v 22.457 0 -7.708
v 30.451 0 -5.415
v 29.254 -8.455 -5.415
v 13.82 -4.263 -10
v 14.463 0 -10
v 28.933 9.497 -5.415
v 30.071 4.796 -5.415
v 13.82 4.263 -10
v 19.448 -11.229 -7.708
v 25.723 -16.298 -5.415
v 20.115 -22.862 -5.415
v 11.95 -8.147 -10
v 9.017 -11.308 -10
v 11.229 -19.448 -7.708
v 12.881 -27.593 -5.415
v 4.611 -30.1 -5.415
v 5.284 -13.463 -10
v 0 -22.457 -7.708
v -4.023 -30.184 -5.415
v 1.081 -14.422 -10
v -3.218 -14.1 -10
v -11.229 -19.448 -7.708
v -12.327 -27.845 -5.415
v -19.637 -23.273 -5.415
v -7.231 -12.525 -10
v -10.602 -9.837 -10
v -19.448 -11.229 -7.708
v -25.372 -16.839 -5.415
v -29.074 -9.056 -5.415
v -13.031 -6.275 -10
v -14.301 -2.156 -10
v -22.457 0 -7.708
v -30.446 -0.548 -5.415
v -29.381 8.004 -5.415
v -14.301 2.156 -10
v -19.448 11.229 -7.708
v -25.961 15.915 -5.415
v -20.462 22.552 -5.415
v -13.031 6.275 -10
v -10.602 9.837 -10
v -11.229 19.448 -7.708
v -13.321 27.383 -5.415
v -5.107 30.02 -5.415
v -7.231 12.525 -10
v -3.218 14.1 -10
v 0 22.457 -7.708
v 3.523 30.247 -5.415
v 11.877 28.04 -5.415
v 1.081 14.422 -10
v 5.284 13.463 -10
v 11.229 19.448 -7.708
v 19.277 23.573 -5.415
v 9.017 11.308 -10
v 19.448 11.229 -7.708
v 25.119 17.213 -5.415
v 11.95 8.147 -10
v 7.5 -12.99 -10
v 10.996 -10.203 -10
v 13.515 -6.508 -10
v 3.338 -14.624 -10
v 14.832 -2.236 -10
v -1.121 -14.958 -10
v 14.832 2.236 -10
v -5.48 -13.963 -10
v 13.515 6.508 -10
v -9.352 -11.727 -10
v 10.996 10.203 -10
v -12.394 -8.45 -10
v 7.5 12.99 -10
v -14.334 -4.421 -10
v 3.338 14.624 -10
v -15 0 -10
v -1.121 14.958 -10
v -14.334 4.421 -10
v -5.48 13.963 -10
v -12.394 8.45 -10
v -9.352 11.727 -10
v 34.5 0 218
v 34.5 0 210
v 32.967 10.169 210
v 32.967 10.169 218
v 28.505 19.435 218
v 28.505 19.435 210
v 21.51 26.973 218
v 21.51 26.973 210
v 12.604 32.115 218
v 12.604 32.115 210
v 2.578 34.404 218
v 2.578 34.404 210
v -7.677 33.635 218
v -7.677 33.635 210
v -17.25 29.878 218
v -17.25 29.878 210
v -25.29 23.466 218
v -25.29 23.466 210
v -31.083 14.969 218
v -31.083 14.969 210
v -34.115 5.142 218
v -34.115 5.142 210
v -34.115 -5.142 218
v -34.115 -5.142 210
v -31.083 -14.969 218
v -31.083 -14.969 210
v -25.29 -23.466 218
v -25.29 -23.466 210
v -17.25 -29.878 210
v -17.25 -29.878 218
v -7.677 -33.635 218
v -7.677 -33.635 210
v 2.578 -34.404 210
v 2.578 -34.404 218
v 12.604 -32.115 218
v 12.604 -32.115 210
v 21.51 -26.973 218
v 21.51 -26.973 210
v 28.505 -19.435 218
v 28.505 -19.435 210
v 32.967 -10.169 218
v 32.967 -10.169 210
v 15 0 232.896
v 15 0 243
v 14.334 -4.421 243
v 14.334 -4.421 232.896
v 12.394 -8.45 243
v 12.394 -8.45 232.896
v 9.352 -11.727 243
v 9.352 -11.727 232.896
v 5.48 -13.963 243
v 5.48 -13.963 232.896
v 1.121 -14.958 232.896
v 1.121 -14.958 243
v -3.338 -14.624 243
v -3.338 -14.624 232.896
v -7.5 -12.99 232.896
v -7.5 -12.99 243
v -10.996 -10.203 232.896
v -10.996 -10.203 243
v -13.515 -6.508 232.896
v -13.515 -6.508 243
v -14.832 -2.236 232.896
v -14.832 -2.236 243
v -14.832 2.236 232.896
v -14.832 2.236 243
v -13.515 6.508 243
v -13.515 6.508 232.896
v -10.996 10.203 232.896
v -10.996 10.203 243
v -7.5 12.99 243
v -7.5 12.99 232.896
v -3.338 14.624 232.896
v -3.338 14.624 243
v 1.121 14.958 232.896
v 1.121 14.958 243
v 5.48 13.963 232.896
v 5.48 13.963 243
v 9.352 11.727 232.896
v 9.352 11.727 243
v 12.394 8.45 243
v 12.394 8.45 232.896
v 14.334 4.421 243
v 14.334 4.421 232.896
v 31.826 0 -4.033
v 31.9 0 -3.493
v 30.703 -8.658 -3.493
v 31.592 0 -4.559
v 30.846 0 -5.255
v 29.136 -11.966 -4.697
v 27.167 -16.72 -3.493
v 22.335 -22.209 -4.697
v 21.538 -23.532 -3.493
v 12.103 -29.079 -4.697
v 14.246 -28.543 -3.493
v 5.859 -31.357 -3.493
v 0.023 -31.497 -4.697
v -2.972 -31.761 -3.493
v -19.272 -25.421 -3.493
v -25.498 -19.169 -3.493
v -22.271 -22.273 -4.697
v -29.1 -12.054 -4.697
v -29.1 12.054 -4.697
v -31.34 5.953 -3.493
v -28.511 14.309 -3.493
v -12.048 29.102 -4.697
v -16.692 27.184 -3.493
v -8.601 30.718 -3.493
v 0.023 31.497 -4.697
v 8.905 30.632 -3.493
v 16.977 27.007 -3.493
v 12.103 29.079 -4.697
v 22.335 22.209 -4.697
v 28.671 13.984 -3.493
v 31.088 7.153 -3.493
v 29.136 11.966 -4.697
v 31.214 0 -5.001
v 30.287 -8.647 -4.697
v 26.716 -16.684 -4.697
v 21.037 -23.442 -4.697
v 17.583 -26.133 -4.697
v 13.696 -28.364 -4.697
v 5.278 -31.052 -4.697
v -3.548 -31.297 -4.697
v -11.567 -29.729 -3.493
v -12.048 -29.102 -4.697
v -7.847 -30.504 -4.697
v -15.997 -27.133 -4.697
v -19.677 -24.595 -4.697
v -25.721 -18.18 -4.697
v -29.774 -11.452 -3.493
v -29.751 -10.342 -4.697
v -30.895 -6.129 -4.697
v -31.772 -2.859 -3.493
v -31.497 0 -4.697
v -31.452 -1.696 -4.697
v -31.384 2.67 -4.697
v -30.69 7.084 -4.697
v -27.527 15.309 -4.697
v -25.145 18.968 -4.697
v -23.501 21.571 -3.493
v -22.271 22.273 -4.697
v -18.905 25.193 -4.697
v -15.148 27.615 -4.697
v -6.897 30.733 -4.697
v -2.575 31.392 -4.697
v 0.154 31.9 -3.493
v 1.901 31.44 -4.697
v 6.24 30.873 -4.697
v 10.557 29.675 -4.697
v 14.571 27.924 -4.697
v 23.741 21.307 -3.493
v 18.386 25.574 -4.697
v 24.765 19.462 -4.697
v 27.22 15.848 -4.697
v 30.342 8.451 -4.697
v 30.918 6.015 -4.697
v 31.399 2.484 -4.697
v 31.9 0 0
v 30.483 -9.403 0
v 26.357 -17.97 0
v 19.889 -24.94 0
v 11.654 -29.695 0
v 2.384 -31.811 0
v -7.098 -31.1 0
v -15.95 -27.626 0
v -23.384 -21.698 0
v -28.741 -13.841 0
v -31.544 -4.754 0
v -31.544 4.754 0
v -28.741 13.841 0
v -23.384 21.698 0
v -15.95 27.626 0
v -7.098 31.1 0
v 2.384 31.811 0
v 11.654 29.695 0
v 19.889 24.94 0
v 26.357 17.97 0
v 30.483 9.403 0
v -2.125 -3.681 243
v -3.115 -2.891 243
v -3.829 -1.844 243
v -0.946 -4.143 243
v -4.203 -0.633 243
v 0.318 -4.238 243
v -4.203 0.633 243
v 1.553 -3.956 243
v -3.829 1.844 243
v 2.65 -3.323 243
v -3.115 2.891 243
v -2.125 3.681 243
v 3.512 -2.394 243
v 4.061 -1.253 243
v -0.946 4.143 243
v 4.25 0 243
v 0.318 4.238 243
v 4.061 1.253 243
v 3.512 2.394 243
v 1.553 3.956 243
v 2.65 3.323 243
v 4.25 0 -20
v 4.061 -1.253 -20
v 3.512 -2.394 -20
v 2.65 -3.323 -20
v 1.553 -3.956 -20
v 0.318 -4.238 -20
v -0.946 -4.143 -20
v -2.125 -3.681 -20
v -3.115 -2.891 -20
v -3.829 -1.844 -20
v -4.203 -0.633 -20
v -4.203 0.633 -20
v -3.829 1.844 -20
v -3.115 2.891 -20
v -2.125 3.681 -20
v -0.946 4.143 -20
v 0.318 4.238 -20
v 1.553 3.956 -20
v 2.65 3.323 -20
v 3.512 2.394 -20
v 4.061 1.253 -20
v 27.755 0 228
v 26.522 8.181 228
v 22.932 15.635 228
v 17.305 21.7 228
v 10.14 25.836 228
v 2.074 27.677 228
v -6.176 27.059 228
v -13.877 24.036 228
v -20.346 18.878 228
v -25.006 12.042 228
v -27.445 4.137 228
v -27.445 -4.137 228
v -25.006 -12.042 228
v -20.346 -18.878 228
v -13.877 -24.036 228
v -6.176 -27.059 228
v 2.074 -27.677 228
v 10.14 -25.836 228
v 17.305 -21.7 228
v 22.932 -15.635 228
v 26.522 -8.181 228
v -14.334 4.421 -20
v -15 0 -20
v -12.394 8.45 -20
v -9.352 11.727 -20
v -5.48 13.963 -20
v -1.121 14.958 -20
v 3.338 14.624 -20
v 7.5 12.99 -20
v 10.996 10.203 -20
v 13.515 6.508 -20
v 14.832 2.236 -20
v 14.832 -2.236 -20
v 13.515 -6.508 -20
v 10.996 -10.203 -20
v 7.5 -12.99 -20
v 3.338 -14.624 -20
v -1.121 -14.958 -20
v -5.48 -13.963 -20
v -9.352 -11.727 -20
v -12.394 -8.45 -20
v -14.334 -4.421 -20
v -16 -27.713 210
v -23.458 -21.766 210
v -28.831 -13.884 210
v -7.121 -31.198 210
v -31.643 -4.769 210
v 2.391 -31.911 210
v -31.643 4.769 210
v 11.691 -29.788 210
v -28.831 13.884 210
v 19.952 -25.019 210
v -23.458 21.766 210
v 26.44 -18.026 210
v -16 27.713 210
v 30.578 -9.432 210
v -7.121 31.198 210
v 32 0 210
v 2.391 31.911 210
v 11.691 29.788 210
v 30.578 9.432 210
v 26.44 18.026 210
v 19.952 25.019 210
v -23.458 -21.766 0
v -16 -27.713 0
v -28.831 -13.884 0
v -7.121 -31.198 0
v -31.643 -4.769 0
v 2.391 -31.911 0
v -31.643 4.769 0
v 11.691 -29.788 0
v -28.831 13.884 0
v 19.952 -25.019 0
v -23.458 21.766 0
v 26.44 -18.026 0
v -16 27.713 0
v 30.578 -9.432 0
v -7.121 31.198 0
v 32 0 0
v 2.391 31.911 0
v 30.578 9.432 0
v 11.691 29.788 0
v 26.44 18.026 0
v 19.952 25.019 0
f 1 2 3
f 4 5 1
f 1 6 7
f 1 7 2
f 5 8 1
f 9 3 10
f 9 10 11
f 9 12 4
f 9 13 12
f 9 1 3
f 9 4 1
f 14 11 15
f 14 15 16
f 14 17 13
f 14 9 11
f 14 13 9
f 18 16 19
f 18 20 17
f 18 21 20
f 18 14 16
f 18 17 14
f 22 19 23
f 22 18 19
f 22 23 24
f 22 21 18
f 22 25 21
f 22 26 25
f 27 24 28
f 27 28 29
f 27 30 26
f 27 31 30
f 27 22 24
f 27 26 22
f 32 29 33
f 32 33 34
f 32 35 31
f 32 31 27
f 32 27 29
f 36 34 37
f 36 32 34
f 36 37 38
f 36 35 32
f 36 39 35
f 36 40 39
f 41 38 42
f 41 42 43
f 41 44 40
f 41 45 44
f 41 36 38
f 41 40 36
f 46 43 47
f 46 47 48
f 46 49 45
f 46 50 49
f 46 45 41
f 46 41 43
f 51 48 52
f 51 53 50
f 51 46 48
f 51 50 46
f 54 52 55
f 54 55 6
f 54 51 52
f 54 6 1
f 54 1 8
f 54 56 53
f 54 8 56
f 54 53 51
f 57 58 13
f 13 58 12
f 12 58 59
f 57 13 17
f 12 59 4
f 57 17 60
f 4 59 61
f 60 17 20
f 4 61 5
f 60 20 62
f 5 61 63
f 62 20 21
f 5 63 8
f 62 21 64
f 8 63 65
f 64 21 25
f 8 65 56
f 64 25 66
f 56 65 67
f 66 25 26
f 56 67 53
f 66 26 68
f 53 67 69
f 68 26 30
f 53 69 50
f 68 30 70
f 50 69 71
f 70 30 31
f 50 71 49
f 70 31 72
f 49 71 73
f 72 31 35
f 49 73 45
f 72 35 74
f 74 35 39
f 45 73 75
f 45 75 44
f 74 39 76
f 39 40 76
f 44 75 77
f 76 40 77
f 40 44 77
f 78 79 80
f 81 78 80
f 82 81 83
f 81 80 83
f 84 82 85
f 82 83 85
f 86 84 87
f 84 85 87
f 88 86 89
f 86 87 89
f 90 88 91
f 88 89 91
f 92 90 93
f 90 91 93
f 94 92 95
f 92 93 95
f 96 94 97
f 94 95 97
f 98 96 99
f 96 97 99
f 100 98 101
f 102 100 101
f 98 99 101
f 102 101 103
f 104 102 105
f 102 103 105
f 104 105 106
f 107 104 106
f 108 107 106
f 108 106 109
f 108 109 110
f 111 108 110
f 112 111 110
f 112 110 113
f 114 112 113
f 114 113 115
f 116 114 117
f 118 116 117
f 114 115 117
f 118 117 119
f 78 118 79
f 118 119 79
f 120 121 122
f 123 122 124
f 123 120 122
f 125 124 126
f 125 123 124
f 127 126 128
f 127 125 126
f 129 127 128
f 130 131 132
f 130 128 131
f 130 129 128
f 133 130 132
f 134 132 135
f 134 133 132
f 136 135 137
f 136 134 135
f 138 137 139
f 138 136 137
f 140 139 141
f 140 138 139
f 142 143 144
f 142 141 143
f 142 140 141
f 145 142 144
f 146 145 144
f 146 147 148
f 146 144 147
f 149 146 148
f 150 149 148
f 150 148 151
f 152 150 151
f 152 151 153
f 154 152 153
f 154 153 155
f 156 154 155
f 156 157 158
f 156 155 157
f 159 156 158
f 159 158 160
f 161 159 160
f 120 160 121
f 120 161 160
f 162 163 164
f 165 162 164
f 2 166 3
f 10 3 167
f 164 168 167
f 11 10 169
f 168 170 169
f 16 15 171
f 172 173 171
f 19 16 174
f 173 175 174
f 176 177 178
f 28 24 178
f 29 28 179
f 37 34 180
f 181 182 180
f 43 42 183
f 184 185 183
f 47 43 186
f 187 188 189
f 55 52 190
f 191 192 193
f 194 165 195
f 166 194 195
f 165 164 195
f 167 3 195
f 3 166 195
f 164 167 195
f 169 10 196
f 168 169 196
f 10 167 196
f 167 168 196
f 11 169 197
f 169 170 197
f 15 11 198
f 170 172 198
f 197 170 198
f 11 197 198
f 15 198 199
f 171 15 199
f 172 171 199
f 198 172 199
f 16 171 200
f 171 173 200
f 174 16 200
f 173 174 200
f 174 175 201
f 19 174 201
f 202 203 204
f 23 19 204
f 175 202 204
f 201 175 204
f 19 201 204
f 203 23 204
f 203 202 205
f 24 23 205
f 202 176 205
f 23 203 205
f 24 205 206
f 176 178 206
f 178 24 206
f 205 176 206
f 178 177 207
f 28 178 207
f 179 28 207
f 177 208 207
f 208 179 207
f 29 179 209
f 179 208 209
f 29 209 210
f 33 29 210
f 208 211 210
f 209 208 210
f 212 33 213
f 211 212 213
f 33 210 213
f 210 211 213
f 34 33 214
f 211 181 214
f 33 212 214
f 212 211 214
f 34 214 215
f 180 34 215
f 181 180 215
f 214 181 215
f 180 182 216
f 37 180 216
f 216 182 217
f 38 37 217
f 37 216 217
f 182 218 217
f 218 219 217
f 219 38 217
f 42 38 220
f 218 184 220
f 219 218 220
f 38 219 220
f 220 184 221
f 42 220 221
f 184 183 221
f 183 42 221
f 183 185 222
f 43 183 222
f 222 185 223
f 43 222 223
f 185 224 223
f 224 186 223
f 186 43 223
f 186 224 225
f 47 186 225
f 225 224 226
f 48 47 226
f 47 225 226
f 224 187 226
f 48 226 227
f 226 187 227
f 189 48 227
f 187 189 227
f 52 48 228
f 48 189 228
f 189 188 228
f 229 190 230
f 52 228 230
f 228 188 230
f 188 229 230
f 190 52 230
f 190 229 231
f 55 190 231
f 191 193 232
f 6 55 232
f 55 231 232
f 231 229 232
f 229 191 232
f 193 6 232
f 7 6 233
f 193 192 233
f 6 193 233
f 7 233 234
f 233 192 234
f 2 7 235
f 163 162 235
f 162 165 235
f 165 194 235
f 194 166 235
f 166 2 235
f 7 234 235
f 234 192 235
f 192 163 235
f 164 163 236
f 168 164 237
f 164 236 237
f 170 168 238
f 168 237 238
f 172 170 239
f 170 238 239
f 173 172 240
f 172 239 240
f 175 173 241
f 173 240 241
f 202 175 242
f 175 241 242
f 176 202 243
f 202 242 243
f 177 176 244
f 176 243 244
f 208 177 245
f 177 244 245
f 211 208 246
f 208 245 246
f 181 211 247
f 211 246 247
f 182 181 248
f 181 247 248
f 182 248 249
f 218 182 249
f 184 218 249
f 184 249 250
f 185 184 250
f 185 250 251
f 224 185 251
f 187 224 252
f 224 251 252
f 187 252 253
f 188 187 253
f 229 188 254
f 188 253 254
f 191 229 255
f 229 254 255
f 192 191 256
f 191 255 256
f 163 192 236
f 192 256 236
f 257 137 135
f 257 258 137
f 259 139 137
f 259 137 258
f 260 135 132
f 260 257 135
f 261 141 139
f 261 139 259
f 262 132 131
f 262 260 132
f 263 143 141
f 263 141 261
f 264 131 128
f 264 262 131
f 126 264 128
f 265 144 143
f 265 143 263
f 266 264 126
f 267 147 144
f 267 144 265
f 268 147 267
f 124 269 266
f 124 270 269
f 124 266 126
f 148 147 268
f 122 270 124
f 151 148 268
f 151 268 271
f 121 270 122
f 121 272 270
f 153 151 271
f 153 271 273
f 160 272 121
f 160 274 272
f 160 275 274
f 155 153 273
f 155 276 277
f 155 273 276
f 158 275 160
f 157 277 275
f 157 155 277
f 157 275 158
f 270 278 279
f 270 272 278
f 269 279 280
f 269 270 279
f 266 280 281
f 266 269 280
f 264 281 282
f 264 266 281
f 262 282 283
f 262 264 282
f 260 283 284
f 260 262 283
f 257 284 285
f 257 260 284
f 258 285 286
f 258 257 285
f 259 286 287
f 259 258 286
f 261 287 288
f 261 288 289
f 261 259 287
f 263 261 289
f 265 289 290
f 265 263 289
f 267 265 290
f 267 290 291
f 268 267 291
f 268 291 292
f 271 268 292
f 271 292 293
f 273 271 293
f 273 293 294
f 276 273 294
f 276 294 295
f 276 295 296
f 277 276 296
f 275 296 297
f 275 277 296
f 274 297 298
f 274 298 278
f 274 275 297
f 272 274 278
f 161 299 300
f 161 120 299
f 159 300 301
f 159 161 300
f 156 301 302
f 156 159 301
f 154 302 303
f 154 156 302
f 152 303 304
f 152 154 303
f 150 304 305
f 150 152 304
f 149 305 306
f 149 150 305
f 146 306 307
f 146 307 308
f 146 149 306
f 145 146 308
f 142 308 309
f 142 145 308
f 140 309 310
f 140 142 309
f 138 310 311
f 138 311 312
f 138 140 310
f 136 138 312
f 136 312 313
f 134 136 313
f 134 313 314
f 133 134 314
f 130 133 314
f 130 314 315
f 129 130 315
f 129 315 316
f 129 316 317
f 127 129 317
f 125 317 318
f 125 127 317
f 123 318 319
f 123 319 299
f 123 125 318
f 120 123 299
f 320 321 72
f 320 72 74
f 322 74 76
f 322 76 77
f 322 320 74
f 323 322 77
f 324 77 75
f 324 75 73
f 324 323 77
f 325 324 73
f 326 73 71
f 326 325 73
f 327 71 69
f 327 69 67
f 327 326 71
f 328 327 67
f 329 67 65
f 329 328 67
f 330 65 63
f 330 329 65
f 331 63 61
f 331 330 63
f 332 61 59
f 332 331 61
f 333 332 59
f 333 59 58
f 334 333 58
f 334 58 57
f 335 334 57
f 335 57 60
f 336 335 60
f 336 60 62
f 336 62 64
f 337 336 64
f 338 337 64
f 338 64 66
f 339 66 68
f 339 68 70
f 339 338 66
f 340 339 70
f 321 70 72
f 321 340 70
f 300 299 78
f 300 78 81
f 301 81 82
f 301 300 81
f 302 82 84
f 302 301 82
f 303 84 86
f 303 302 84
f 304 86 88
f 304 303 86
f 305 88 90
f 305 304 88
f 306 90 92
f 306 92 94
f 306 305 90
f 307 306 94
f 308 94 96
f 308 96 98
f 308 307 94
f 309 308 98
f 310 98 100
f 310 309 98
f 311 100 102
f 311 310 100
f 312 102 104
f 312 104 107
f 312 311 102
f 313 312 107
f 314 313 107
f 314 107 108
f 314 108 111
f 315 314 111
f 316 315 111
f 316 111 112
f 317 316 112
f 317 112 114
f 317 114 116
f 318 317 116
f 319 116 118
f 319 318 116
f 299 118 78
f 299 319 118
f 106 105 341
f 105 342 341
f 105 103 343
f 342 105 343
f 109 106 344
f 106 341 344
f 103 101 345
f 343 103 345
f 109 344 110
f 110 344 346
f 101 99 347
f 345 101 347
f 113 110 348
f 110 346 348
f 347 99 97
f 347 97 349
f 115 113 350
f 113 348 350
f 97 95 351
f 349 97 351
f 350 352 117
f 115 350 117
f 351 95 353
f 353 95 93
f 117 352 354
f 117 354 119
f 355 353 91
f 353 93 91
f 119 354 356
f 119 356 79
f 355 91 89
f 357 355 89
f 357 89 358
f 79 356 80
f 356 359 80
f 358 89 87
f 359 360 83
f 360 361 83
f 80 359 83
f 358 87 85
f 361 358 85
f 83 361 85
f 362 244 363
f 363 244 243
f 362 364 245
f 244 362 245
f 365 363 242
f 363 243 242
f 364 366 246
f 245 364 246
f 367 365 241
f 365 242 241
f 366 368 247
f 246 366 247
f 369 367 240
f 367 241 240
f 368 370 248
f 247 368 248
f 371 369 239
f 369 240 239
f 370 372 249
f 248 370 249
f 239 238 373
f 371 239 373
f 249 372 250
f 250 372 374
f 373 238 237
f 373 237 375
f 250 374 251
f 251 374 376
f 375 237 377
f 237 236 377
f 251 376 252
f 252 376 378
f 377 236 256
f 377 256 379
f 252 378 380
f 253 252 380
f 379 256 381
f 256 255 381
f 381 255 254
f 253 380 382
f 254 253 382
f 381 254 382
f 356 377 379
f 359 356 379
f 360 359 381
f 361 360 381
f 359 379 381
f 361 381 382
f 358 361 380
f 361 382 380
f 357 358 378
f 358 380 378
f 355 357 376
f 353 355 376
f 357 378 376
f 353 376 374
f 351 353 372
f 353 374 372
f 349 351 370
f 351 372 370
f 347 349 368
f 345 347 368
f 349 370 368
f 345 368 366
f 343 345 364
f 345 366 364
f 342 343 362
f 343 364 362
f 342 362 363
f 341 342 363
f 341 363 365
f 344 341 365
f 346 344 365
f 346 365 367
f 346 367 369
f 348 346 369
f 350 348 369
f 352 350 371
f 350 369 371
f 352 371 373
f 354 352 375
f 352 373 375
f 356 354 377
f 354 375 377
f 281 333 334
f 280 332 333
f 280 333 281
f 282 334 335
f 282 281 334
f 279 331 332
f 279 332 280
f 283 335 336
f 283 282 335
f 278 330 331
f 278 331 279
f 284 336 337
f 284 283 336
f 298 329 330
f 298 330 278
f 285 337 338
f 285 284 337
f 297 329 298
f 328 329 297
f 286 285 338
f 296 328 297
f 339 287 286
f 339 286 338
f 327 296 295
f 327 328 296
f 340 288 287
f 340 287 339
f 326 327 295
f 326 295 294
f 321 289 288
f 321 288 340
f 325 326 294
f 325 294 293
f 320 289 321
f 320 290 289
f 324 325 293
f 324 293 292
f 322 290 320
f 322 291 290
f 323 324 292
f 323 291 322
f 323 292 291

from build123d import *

# Parameters (mm, degrees)
SKETCH1_R           = 32
BOSS_EXTRUDE1_DEPTH = 210
SKETCH2_R           = 34.5
BOSS_EXTRUDE2_DEPTH = 18
CHAMFER1_SIZE       = 10
CHAMFER1_SIZE2      = 6.745085168
SKETCH3_R           = 27.754914832
BOSS_EXTRUDE3_DEPTH = 5
SKETCH4_R           = 15
BOSS_EXTRUDE4_DEPTH = 10
SKETCH5_R           = 4.25
CUT_EXTRUDE1_DEPTH  = 854
CHAMFER2_SIZE       = 5
CHAMFER2_SIZE_2     = 13.025445323
SKETCH7_R           = 31.9
BOSS_EXTRUDE7_DEPTH = 10
CHAMFER3_SIZE       = 5
CHAMFER3_SIZE2      = 17.437072219
FILLET1_R           = 2
BOSS_EXTRUDE8_START = 10
SKETCH8_R           = 15
BOSS_EXTRUDE8_DEPTH = 10
CUT_EXTRUDE2_START  = -311
SKETCH9_R           = 4.25
CUT_EXTRUDE2_DEPTH  = 311


with BuildPart() as part:
    # Sketch1 → Boss-Extrude1 (new body)
    with BuildSketch(Plane.XY):
        Circle(SKETCH1_R)
    extrude(amount=BOSS_EXTRUDE1_DEPTH)

    # Sketch2 → Boss-Extrude2 (add)
    with BuildSketch(Plane.XY.offset(210)):
        Circle(SKETCH2_R)
    extrude(amount=BOSS_EXTRUDE2_DEPTH)

    # Chamfer1
    chamfer1_edges = [part.edges().sort_by_distance(p)[0] for p in [
        (-34.5, 0, 228),
    ]]
    chamfer1_side = [part.faces().sort_by_distance(p)[0] for p in [
        (-34.5, 0, 219),
    ]]
    chamfer(chamfer1_edges, length=CHAMFER1_SIZE, length2=CHAMFER1_SIZE2, reference=chamfer1_side[0])

    # Sketch3 → Boss-Extrude3 (add)
    with BuildSketch(Plane.XY.offset(228)):
        Circle(SKETCH3_R)
    extrude(amount=BOSS_EXTRUDE3_DEPTH)

    # Sketch4 → Boss-Extrude4 (add)
    with BuildSketch(Plane.XY.offset(233)):
        Circle(SKETCH4_R)
    extrude(amount=BOSS_EXTRUDE4_DEPTH)

    # Sketch5 → Cut-Extrude1 (cut)
    with BuildSketch(Plane.XY.offset(243)):
        Circle(SKETCH5_R)
    extrude(amount=-CUT_EXTRUDE1_DEPTH, mode=Mode.SUBTRACT)

    # Chamfer2
    # the kernel refuses this chamfer: 13.025445323, 5 mm, written as the material it takes off along each edge
    with BuildSketch(Plane(origin=(0, 0, 233), x_dir=(1, 0, 0), z_dir=(0, -1, 0))) as chamfer2_piece_1_section:
        Polygon((27.754914832, -CHAMFER2_SIZE), (27.754914832 - CHAMFER2_SIZE_2, 0), (27.754914832, 0), align=None)
    chamfer2_piece_1 = revolve(axis=Axis((0, 0, 233), (0, 0, 1)), mode=Mode.PRIVATE)
    chamfer2_piece_1 = chamfer2_piece_1 - Plane(origin=(0, 0, 228.02141562), x_dir=(1, 0, 0), z_dir=(0, 0, -1)) * Cylinder(15, 112, mode=Mode.PRIVATE)
    add(chamfer2_piece_1, mode=Mode.SUBTRACT)

    # Sketch7 → Boss-Extrude7 (add)
    with BuildSketch(Plane(origin=(0, 0, 0), x_dir=(-1, 0, 0), z_dir=(0, 0, -1))):
        with Locations(Location((0, 0, 0), (0, 0, 180))):
            Circle(SKETCH7_R)
    extrude(amount=BOSS_EXTRUDE7_DEPTH)

    # Chamfer3
    chamfer3_edges = [part.edges().sort_by_distance(p)[0] for p in [
        (-31.9, 0, -10),
    ]]
    chamfer3_side = [part.faces().sort_by_distance(p)[0] for p in [
        (-31.9, 0, -5),
    ]]
    chamfer(chamfer3_edges, length=CHAMFER3_SIZE, length2=CHAMFER3_SIZE2, reference=chamfer3_side[0])

    # Fillet1
    fillet1_edges = [part.edges().sort_by_distance(p)[0] for p in [
        (-31.9, 0, -5),
    ]]
    fillet(fillet1_edges, radius=FILLET1_R)

    # Sketch8 → Boss-Extrude8 (add)
    with BuildSketch(Plane(origin=(0, 0, -10), x_dir=(-1, 0, 0), z_dir=(0, 0, -1)).offset(BOSS_EXTRUDE8_START)):
        Circle(SKETCH8_R)
    extrude(amount=-BOSS_EXTRUDE8_DEPTH)

    # Sketch9 → Cut-Extrude2 (cut)
    with BuildSketch(Plane(origin=(0, 0, -20), x_dir=(-1, 0, 0), z_dir=(0, 0, -1)).offset(CUT_EXTRUDE2_START)):
        with Locations(Location((0, 0, 0), (0, 0, 180))):
            Circle(SKETCH9_R)
    extrude(amount=CUT_EXTRUDE2_DEPTH, mode=Mode.SUBTRACT)


solid = part.part
